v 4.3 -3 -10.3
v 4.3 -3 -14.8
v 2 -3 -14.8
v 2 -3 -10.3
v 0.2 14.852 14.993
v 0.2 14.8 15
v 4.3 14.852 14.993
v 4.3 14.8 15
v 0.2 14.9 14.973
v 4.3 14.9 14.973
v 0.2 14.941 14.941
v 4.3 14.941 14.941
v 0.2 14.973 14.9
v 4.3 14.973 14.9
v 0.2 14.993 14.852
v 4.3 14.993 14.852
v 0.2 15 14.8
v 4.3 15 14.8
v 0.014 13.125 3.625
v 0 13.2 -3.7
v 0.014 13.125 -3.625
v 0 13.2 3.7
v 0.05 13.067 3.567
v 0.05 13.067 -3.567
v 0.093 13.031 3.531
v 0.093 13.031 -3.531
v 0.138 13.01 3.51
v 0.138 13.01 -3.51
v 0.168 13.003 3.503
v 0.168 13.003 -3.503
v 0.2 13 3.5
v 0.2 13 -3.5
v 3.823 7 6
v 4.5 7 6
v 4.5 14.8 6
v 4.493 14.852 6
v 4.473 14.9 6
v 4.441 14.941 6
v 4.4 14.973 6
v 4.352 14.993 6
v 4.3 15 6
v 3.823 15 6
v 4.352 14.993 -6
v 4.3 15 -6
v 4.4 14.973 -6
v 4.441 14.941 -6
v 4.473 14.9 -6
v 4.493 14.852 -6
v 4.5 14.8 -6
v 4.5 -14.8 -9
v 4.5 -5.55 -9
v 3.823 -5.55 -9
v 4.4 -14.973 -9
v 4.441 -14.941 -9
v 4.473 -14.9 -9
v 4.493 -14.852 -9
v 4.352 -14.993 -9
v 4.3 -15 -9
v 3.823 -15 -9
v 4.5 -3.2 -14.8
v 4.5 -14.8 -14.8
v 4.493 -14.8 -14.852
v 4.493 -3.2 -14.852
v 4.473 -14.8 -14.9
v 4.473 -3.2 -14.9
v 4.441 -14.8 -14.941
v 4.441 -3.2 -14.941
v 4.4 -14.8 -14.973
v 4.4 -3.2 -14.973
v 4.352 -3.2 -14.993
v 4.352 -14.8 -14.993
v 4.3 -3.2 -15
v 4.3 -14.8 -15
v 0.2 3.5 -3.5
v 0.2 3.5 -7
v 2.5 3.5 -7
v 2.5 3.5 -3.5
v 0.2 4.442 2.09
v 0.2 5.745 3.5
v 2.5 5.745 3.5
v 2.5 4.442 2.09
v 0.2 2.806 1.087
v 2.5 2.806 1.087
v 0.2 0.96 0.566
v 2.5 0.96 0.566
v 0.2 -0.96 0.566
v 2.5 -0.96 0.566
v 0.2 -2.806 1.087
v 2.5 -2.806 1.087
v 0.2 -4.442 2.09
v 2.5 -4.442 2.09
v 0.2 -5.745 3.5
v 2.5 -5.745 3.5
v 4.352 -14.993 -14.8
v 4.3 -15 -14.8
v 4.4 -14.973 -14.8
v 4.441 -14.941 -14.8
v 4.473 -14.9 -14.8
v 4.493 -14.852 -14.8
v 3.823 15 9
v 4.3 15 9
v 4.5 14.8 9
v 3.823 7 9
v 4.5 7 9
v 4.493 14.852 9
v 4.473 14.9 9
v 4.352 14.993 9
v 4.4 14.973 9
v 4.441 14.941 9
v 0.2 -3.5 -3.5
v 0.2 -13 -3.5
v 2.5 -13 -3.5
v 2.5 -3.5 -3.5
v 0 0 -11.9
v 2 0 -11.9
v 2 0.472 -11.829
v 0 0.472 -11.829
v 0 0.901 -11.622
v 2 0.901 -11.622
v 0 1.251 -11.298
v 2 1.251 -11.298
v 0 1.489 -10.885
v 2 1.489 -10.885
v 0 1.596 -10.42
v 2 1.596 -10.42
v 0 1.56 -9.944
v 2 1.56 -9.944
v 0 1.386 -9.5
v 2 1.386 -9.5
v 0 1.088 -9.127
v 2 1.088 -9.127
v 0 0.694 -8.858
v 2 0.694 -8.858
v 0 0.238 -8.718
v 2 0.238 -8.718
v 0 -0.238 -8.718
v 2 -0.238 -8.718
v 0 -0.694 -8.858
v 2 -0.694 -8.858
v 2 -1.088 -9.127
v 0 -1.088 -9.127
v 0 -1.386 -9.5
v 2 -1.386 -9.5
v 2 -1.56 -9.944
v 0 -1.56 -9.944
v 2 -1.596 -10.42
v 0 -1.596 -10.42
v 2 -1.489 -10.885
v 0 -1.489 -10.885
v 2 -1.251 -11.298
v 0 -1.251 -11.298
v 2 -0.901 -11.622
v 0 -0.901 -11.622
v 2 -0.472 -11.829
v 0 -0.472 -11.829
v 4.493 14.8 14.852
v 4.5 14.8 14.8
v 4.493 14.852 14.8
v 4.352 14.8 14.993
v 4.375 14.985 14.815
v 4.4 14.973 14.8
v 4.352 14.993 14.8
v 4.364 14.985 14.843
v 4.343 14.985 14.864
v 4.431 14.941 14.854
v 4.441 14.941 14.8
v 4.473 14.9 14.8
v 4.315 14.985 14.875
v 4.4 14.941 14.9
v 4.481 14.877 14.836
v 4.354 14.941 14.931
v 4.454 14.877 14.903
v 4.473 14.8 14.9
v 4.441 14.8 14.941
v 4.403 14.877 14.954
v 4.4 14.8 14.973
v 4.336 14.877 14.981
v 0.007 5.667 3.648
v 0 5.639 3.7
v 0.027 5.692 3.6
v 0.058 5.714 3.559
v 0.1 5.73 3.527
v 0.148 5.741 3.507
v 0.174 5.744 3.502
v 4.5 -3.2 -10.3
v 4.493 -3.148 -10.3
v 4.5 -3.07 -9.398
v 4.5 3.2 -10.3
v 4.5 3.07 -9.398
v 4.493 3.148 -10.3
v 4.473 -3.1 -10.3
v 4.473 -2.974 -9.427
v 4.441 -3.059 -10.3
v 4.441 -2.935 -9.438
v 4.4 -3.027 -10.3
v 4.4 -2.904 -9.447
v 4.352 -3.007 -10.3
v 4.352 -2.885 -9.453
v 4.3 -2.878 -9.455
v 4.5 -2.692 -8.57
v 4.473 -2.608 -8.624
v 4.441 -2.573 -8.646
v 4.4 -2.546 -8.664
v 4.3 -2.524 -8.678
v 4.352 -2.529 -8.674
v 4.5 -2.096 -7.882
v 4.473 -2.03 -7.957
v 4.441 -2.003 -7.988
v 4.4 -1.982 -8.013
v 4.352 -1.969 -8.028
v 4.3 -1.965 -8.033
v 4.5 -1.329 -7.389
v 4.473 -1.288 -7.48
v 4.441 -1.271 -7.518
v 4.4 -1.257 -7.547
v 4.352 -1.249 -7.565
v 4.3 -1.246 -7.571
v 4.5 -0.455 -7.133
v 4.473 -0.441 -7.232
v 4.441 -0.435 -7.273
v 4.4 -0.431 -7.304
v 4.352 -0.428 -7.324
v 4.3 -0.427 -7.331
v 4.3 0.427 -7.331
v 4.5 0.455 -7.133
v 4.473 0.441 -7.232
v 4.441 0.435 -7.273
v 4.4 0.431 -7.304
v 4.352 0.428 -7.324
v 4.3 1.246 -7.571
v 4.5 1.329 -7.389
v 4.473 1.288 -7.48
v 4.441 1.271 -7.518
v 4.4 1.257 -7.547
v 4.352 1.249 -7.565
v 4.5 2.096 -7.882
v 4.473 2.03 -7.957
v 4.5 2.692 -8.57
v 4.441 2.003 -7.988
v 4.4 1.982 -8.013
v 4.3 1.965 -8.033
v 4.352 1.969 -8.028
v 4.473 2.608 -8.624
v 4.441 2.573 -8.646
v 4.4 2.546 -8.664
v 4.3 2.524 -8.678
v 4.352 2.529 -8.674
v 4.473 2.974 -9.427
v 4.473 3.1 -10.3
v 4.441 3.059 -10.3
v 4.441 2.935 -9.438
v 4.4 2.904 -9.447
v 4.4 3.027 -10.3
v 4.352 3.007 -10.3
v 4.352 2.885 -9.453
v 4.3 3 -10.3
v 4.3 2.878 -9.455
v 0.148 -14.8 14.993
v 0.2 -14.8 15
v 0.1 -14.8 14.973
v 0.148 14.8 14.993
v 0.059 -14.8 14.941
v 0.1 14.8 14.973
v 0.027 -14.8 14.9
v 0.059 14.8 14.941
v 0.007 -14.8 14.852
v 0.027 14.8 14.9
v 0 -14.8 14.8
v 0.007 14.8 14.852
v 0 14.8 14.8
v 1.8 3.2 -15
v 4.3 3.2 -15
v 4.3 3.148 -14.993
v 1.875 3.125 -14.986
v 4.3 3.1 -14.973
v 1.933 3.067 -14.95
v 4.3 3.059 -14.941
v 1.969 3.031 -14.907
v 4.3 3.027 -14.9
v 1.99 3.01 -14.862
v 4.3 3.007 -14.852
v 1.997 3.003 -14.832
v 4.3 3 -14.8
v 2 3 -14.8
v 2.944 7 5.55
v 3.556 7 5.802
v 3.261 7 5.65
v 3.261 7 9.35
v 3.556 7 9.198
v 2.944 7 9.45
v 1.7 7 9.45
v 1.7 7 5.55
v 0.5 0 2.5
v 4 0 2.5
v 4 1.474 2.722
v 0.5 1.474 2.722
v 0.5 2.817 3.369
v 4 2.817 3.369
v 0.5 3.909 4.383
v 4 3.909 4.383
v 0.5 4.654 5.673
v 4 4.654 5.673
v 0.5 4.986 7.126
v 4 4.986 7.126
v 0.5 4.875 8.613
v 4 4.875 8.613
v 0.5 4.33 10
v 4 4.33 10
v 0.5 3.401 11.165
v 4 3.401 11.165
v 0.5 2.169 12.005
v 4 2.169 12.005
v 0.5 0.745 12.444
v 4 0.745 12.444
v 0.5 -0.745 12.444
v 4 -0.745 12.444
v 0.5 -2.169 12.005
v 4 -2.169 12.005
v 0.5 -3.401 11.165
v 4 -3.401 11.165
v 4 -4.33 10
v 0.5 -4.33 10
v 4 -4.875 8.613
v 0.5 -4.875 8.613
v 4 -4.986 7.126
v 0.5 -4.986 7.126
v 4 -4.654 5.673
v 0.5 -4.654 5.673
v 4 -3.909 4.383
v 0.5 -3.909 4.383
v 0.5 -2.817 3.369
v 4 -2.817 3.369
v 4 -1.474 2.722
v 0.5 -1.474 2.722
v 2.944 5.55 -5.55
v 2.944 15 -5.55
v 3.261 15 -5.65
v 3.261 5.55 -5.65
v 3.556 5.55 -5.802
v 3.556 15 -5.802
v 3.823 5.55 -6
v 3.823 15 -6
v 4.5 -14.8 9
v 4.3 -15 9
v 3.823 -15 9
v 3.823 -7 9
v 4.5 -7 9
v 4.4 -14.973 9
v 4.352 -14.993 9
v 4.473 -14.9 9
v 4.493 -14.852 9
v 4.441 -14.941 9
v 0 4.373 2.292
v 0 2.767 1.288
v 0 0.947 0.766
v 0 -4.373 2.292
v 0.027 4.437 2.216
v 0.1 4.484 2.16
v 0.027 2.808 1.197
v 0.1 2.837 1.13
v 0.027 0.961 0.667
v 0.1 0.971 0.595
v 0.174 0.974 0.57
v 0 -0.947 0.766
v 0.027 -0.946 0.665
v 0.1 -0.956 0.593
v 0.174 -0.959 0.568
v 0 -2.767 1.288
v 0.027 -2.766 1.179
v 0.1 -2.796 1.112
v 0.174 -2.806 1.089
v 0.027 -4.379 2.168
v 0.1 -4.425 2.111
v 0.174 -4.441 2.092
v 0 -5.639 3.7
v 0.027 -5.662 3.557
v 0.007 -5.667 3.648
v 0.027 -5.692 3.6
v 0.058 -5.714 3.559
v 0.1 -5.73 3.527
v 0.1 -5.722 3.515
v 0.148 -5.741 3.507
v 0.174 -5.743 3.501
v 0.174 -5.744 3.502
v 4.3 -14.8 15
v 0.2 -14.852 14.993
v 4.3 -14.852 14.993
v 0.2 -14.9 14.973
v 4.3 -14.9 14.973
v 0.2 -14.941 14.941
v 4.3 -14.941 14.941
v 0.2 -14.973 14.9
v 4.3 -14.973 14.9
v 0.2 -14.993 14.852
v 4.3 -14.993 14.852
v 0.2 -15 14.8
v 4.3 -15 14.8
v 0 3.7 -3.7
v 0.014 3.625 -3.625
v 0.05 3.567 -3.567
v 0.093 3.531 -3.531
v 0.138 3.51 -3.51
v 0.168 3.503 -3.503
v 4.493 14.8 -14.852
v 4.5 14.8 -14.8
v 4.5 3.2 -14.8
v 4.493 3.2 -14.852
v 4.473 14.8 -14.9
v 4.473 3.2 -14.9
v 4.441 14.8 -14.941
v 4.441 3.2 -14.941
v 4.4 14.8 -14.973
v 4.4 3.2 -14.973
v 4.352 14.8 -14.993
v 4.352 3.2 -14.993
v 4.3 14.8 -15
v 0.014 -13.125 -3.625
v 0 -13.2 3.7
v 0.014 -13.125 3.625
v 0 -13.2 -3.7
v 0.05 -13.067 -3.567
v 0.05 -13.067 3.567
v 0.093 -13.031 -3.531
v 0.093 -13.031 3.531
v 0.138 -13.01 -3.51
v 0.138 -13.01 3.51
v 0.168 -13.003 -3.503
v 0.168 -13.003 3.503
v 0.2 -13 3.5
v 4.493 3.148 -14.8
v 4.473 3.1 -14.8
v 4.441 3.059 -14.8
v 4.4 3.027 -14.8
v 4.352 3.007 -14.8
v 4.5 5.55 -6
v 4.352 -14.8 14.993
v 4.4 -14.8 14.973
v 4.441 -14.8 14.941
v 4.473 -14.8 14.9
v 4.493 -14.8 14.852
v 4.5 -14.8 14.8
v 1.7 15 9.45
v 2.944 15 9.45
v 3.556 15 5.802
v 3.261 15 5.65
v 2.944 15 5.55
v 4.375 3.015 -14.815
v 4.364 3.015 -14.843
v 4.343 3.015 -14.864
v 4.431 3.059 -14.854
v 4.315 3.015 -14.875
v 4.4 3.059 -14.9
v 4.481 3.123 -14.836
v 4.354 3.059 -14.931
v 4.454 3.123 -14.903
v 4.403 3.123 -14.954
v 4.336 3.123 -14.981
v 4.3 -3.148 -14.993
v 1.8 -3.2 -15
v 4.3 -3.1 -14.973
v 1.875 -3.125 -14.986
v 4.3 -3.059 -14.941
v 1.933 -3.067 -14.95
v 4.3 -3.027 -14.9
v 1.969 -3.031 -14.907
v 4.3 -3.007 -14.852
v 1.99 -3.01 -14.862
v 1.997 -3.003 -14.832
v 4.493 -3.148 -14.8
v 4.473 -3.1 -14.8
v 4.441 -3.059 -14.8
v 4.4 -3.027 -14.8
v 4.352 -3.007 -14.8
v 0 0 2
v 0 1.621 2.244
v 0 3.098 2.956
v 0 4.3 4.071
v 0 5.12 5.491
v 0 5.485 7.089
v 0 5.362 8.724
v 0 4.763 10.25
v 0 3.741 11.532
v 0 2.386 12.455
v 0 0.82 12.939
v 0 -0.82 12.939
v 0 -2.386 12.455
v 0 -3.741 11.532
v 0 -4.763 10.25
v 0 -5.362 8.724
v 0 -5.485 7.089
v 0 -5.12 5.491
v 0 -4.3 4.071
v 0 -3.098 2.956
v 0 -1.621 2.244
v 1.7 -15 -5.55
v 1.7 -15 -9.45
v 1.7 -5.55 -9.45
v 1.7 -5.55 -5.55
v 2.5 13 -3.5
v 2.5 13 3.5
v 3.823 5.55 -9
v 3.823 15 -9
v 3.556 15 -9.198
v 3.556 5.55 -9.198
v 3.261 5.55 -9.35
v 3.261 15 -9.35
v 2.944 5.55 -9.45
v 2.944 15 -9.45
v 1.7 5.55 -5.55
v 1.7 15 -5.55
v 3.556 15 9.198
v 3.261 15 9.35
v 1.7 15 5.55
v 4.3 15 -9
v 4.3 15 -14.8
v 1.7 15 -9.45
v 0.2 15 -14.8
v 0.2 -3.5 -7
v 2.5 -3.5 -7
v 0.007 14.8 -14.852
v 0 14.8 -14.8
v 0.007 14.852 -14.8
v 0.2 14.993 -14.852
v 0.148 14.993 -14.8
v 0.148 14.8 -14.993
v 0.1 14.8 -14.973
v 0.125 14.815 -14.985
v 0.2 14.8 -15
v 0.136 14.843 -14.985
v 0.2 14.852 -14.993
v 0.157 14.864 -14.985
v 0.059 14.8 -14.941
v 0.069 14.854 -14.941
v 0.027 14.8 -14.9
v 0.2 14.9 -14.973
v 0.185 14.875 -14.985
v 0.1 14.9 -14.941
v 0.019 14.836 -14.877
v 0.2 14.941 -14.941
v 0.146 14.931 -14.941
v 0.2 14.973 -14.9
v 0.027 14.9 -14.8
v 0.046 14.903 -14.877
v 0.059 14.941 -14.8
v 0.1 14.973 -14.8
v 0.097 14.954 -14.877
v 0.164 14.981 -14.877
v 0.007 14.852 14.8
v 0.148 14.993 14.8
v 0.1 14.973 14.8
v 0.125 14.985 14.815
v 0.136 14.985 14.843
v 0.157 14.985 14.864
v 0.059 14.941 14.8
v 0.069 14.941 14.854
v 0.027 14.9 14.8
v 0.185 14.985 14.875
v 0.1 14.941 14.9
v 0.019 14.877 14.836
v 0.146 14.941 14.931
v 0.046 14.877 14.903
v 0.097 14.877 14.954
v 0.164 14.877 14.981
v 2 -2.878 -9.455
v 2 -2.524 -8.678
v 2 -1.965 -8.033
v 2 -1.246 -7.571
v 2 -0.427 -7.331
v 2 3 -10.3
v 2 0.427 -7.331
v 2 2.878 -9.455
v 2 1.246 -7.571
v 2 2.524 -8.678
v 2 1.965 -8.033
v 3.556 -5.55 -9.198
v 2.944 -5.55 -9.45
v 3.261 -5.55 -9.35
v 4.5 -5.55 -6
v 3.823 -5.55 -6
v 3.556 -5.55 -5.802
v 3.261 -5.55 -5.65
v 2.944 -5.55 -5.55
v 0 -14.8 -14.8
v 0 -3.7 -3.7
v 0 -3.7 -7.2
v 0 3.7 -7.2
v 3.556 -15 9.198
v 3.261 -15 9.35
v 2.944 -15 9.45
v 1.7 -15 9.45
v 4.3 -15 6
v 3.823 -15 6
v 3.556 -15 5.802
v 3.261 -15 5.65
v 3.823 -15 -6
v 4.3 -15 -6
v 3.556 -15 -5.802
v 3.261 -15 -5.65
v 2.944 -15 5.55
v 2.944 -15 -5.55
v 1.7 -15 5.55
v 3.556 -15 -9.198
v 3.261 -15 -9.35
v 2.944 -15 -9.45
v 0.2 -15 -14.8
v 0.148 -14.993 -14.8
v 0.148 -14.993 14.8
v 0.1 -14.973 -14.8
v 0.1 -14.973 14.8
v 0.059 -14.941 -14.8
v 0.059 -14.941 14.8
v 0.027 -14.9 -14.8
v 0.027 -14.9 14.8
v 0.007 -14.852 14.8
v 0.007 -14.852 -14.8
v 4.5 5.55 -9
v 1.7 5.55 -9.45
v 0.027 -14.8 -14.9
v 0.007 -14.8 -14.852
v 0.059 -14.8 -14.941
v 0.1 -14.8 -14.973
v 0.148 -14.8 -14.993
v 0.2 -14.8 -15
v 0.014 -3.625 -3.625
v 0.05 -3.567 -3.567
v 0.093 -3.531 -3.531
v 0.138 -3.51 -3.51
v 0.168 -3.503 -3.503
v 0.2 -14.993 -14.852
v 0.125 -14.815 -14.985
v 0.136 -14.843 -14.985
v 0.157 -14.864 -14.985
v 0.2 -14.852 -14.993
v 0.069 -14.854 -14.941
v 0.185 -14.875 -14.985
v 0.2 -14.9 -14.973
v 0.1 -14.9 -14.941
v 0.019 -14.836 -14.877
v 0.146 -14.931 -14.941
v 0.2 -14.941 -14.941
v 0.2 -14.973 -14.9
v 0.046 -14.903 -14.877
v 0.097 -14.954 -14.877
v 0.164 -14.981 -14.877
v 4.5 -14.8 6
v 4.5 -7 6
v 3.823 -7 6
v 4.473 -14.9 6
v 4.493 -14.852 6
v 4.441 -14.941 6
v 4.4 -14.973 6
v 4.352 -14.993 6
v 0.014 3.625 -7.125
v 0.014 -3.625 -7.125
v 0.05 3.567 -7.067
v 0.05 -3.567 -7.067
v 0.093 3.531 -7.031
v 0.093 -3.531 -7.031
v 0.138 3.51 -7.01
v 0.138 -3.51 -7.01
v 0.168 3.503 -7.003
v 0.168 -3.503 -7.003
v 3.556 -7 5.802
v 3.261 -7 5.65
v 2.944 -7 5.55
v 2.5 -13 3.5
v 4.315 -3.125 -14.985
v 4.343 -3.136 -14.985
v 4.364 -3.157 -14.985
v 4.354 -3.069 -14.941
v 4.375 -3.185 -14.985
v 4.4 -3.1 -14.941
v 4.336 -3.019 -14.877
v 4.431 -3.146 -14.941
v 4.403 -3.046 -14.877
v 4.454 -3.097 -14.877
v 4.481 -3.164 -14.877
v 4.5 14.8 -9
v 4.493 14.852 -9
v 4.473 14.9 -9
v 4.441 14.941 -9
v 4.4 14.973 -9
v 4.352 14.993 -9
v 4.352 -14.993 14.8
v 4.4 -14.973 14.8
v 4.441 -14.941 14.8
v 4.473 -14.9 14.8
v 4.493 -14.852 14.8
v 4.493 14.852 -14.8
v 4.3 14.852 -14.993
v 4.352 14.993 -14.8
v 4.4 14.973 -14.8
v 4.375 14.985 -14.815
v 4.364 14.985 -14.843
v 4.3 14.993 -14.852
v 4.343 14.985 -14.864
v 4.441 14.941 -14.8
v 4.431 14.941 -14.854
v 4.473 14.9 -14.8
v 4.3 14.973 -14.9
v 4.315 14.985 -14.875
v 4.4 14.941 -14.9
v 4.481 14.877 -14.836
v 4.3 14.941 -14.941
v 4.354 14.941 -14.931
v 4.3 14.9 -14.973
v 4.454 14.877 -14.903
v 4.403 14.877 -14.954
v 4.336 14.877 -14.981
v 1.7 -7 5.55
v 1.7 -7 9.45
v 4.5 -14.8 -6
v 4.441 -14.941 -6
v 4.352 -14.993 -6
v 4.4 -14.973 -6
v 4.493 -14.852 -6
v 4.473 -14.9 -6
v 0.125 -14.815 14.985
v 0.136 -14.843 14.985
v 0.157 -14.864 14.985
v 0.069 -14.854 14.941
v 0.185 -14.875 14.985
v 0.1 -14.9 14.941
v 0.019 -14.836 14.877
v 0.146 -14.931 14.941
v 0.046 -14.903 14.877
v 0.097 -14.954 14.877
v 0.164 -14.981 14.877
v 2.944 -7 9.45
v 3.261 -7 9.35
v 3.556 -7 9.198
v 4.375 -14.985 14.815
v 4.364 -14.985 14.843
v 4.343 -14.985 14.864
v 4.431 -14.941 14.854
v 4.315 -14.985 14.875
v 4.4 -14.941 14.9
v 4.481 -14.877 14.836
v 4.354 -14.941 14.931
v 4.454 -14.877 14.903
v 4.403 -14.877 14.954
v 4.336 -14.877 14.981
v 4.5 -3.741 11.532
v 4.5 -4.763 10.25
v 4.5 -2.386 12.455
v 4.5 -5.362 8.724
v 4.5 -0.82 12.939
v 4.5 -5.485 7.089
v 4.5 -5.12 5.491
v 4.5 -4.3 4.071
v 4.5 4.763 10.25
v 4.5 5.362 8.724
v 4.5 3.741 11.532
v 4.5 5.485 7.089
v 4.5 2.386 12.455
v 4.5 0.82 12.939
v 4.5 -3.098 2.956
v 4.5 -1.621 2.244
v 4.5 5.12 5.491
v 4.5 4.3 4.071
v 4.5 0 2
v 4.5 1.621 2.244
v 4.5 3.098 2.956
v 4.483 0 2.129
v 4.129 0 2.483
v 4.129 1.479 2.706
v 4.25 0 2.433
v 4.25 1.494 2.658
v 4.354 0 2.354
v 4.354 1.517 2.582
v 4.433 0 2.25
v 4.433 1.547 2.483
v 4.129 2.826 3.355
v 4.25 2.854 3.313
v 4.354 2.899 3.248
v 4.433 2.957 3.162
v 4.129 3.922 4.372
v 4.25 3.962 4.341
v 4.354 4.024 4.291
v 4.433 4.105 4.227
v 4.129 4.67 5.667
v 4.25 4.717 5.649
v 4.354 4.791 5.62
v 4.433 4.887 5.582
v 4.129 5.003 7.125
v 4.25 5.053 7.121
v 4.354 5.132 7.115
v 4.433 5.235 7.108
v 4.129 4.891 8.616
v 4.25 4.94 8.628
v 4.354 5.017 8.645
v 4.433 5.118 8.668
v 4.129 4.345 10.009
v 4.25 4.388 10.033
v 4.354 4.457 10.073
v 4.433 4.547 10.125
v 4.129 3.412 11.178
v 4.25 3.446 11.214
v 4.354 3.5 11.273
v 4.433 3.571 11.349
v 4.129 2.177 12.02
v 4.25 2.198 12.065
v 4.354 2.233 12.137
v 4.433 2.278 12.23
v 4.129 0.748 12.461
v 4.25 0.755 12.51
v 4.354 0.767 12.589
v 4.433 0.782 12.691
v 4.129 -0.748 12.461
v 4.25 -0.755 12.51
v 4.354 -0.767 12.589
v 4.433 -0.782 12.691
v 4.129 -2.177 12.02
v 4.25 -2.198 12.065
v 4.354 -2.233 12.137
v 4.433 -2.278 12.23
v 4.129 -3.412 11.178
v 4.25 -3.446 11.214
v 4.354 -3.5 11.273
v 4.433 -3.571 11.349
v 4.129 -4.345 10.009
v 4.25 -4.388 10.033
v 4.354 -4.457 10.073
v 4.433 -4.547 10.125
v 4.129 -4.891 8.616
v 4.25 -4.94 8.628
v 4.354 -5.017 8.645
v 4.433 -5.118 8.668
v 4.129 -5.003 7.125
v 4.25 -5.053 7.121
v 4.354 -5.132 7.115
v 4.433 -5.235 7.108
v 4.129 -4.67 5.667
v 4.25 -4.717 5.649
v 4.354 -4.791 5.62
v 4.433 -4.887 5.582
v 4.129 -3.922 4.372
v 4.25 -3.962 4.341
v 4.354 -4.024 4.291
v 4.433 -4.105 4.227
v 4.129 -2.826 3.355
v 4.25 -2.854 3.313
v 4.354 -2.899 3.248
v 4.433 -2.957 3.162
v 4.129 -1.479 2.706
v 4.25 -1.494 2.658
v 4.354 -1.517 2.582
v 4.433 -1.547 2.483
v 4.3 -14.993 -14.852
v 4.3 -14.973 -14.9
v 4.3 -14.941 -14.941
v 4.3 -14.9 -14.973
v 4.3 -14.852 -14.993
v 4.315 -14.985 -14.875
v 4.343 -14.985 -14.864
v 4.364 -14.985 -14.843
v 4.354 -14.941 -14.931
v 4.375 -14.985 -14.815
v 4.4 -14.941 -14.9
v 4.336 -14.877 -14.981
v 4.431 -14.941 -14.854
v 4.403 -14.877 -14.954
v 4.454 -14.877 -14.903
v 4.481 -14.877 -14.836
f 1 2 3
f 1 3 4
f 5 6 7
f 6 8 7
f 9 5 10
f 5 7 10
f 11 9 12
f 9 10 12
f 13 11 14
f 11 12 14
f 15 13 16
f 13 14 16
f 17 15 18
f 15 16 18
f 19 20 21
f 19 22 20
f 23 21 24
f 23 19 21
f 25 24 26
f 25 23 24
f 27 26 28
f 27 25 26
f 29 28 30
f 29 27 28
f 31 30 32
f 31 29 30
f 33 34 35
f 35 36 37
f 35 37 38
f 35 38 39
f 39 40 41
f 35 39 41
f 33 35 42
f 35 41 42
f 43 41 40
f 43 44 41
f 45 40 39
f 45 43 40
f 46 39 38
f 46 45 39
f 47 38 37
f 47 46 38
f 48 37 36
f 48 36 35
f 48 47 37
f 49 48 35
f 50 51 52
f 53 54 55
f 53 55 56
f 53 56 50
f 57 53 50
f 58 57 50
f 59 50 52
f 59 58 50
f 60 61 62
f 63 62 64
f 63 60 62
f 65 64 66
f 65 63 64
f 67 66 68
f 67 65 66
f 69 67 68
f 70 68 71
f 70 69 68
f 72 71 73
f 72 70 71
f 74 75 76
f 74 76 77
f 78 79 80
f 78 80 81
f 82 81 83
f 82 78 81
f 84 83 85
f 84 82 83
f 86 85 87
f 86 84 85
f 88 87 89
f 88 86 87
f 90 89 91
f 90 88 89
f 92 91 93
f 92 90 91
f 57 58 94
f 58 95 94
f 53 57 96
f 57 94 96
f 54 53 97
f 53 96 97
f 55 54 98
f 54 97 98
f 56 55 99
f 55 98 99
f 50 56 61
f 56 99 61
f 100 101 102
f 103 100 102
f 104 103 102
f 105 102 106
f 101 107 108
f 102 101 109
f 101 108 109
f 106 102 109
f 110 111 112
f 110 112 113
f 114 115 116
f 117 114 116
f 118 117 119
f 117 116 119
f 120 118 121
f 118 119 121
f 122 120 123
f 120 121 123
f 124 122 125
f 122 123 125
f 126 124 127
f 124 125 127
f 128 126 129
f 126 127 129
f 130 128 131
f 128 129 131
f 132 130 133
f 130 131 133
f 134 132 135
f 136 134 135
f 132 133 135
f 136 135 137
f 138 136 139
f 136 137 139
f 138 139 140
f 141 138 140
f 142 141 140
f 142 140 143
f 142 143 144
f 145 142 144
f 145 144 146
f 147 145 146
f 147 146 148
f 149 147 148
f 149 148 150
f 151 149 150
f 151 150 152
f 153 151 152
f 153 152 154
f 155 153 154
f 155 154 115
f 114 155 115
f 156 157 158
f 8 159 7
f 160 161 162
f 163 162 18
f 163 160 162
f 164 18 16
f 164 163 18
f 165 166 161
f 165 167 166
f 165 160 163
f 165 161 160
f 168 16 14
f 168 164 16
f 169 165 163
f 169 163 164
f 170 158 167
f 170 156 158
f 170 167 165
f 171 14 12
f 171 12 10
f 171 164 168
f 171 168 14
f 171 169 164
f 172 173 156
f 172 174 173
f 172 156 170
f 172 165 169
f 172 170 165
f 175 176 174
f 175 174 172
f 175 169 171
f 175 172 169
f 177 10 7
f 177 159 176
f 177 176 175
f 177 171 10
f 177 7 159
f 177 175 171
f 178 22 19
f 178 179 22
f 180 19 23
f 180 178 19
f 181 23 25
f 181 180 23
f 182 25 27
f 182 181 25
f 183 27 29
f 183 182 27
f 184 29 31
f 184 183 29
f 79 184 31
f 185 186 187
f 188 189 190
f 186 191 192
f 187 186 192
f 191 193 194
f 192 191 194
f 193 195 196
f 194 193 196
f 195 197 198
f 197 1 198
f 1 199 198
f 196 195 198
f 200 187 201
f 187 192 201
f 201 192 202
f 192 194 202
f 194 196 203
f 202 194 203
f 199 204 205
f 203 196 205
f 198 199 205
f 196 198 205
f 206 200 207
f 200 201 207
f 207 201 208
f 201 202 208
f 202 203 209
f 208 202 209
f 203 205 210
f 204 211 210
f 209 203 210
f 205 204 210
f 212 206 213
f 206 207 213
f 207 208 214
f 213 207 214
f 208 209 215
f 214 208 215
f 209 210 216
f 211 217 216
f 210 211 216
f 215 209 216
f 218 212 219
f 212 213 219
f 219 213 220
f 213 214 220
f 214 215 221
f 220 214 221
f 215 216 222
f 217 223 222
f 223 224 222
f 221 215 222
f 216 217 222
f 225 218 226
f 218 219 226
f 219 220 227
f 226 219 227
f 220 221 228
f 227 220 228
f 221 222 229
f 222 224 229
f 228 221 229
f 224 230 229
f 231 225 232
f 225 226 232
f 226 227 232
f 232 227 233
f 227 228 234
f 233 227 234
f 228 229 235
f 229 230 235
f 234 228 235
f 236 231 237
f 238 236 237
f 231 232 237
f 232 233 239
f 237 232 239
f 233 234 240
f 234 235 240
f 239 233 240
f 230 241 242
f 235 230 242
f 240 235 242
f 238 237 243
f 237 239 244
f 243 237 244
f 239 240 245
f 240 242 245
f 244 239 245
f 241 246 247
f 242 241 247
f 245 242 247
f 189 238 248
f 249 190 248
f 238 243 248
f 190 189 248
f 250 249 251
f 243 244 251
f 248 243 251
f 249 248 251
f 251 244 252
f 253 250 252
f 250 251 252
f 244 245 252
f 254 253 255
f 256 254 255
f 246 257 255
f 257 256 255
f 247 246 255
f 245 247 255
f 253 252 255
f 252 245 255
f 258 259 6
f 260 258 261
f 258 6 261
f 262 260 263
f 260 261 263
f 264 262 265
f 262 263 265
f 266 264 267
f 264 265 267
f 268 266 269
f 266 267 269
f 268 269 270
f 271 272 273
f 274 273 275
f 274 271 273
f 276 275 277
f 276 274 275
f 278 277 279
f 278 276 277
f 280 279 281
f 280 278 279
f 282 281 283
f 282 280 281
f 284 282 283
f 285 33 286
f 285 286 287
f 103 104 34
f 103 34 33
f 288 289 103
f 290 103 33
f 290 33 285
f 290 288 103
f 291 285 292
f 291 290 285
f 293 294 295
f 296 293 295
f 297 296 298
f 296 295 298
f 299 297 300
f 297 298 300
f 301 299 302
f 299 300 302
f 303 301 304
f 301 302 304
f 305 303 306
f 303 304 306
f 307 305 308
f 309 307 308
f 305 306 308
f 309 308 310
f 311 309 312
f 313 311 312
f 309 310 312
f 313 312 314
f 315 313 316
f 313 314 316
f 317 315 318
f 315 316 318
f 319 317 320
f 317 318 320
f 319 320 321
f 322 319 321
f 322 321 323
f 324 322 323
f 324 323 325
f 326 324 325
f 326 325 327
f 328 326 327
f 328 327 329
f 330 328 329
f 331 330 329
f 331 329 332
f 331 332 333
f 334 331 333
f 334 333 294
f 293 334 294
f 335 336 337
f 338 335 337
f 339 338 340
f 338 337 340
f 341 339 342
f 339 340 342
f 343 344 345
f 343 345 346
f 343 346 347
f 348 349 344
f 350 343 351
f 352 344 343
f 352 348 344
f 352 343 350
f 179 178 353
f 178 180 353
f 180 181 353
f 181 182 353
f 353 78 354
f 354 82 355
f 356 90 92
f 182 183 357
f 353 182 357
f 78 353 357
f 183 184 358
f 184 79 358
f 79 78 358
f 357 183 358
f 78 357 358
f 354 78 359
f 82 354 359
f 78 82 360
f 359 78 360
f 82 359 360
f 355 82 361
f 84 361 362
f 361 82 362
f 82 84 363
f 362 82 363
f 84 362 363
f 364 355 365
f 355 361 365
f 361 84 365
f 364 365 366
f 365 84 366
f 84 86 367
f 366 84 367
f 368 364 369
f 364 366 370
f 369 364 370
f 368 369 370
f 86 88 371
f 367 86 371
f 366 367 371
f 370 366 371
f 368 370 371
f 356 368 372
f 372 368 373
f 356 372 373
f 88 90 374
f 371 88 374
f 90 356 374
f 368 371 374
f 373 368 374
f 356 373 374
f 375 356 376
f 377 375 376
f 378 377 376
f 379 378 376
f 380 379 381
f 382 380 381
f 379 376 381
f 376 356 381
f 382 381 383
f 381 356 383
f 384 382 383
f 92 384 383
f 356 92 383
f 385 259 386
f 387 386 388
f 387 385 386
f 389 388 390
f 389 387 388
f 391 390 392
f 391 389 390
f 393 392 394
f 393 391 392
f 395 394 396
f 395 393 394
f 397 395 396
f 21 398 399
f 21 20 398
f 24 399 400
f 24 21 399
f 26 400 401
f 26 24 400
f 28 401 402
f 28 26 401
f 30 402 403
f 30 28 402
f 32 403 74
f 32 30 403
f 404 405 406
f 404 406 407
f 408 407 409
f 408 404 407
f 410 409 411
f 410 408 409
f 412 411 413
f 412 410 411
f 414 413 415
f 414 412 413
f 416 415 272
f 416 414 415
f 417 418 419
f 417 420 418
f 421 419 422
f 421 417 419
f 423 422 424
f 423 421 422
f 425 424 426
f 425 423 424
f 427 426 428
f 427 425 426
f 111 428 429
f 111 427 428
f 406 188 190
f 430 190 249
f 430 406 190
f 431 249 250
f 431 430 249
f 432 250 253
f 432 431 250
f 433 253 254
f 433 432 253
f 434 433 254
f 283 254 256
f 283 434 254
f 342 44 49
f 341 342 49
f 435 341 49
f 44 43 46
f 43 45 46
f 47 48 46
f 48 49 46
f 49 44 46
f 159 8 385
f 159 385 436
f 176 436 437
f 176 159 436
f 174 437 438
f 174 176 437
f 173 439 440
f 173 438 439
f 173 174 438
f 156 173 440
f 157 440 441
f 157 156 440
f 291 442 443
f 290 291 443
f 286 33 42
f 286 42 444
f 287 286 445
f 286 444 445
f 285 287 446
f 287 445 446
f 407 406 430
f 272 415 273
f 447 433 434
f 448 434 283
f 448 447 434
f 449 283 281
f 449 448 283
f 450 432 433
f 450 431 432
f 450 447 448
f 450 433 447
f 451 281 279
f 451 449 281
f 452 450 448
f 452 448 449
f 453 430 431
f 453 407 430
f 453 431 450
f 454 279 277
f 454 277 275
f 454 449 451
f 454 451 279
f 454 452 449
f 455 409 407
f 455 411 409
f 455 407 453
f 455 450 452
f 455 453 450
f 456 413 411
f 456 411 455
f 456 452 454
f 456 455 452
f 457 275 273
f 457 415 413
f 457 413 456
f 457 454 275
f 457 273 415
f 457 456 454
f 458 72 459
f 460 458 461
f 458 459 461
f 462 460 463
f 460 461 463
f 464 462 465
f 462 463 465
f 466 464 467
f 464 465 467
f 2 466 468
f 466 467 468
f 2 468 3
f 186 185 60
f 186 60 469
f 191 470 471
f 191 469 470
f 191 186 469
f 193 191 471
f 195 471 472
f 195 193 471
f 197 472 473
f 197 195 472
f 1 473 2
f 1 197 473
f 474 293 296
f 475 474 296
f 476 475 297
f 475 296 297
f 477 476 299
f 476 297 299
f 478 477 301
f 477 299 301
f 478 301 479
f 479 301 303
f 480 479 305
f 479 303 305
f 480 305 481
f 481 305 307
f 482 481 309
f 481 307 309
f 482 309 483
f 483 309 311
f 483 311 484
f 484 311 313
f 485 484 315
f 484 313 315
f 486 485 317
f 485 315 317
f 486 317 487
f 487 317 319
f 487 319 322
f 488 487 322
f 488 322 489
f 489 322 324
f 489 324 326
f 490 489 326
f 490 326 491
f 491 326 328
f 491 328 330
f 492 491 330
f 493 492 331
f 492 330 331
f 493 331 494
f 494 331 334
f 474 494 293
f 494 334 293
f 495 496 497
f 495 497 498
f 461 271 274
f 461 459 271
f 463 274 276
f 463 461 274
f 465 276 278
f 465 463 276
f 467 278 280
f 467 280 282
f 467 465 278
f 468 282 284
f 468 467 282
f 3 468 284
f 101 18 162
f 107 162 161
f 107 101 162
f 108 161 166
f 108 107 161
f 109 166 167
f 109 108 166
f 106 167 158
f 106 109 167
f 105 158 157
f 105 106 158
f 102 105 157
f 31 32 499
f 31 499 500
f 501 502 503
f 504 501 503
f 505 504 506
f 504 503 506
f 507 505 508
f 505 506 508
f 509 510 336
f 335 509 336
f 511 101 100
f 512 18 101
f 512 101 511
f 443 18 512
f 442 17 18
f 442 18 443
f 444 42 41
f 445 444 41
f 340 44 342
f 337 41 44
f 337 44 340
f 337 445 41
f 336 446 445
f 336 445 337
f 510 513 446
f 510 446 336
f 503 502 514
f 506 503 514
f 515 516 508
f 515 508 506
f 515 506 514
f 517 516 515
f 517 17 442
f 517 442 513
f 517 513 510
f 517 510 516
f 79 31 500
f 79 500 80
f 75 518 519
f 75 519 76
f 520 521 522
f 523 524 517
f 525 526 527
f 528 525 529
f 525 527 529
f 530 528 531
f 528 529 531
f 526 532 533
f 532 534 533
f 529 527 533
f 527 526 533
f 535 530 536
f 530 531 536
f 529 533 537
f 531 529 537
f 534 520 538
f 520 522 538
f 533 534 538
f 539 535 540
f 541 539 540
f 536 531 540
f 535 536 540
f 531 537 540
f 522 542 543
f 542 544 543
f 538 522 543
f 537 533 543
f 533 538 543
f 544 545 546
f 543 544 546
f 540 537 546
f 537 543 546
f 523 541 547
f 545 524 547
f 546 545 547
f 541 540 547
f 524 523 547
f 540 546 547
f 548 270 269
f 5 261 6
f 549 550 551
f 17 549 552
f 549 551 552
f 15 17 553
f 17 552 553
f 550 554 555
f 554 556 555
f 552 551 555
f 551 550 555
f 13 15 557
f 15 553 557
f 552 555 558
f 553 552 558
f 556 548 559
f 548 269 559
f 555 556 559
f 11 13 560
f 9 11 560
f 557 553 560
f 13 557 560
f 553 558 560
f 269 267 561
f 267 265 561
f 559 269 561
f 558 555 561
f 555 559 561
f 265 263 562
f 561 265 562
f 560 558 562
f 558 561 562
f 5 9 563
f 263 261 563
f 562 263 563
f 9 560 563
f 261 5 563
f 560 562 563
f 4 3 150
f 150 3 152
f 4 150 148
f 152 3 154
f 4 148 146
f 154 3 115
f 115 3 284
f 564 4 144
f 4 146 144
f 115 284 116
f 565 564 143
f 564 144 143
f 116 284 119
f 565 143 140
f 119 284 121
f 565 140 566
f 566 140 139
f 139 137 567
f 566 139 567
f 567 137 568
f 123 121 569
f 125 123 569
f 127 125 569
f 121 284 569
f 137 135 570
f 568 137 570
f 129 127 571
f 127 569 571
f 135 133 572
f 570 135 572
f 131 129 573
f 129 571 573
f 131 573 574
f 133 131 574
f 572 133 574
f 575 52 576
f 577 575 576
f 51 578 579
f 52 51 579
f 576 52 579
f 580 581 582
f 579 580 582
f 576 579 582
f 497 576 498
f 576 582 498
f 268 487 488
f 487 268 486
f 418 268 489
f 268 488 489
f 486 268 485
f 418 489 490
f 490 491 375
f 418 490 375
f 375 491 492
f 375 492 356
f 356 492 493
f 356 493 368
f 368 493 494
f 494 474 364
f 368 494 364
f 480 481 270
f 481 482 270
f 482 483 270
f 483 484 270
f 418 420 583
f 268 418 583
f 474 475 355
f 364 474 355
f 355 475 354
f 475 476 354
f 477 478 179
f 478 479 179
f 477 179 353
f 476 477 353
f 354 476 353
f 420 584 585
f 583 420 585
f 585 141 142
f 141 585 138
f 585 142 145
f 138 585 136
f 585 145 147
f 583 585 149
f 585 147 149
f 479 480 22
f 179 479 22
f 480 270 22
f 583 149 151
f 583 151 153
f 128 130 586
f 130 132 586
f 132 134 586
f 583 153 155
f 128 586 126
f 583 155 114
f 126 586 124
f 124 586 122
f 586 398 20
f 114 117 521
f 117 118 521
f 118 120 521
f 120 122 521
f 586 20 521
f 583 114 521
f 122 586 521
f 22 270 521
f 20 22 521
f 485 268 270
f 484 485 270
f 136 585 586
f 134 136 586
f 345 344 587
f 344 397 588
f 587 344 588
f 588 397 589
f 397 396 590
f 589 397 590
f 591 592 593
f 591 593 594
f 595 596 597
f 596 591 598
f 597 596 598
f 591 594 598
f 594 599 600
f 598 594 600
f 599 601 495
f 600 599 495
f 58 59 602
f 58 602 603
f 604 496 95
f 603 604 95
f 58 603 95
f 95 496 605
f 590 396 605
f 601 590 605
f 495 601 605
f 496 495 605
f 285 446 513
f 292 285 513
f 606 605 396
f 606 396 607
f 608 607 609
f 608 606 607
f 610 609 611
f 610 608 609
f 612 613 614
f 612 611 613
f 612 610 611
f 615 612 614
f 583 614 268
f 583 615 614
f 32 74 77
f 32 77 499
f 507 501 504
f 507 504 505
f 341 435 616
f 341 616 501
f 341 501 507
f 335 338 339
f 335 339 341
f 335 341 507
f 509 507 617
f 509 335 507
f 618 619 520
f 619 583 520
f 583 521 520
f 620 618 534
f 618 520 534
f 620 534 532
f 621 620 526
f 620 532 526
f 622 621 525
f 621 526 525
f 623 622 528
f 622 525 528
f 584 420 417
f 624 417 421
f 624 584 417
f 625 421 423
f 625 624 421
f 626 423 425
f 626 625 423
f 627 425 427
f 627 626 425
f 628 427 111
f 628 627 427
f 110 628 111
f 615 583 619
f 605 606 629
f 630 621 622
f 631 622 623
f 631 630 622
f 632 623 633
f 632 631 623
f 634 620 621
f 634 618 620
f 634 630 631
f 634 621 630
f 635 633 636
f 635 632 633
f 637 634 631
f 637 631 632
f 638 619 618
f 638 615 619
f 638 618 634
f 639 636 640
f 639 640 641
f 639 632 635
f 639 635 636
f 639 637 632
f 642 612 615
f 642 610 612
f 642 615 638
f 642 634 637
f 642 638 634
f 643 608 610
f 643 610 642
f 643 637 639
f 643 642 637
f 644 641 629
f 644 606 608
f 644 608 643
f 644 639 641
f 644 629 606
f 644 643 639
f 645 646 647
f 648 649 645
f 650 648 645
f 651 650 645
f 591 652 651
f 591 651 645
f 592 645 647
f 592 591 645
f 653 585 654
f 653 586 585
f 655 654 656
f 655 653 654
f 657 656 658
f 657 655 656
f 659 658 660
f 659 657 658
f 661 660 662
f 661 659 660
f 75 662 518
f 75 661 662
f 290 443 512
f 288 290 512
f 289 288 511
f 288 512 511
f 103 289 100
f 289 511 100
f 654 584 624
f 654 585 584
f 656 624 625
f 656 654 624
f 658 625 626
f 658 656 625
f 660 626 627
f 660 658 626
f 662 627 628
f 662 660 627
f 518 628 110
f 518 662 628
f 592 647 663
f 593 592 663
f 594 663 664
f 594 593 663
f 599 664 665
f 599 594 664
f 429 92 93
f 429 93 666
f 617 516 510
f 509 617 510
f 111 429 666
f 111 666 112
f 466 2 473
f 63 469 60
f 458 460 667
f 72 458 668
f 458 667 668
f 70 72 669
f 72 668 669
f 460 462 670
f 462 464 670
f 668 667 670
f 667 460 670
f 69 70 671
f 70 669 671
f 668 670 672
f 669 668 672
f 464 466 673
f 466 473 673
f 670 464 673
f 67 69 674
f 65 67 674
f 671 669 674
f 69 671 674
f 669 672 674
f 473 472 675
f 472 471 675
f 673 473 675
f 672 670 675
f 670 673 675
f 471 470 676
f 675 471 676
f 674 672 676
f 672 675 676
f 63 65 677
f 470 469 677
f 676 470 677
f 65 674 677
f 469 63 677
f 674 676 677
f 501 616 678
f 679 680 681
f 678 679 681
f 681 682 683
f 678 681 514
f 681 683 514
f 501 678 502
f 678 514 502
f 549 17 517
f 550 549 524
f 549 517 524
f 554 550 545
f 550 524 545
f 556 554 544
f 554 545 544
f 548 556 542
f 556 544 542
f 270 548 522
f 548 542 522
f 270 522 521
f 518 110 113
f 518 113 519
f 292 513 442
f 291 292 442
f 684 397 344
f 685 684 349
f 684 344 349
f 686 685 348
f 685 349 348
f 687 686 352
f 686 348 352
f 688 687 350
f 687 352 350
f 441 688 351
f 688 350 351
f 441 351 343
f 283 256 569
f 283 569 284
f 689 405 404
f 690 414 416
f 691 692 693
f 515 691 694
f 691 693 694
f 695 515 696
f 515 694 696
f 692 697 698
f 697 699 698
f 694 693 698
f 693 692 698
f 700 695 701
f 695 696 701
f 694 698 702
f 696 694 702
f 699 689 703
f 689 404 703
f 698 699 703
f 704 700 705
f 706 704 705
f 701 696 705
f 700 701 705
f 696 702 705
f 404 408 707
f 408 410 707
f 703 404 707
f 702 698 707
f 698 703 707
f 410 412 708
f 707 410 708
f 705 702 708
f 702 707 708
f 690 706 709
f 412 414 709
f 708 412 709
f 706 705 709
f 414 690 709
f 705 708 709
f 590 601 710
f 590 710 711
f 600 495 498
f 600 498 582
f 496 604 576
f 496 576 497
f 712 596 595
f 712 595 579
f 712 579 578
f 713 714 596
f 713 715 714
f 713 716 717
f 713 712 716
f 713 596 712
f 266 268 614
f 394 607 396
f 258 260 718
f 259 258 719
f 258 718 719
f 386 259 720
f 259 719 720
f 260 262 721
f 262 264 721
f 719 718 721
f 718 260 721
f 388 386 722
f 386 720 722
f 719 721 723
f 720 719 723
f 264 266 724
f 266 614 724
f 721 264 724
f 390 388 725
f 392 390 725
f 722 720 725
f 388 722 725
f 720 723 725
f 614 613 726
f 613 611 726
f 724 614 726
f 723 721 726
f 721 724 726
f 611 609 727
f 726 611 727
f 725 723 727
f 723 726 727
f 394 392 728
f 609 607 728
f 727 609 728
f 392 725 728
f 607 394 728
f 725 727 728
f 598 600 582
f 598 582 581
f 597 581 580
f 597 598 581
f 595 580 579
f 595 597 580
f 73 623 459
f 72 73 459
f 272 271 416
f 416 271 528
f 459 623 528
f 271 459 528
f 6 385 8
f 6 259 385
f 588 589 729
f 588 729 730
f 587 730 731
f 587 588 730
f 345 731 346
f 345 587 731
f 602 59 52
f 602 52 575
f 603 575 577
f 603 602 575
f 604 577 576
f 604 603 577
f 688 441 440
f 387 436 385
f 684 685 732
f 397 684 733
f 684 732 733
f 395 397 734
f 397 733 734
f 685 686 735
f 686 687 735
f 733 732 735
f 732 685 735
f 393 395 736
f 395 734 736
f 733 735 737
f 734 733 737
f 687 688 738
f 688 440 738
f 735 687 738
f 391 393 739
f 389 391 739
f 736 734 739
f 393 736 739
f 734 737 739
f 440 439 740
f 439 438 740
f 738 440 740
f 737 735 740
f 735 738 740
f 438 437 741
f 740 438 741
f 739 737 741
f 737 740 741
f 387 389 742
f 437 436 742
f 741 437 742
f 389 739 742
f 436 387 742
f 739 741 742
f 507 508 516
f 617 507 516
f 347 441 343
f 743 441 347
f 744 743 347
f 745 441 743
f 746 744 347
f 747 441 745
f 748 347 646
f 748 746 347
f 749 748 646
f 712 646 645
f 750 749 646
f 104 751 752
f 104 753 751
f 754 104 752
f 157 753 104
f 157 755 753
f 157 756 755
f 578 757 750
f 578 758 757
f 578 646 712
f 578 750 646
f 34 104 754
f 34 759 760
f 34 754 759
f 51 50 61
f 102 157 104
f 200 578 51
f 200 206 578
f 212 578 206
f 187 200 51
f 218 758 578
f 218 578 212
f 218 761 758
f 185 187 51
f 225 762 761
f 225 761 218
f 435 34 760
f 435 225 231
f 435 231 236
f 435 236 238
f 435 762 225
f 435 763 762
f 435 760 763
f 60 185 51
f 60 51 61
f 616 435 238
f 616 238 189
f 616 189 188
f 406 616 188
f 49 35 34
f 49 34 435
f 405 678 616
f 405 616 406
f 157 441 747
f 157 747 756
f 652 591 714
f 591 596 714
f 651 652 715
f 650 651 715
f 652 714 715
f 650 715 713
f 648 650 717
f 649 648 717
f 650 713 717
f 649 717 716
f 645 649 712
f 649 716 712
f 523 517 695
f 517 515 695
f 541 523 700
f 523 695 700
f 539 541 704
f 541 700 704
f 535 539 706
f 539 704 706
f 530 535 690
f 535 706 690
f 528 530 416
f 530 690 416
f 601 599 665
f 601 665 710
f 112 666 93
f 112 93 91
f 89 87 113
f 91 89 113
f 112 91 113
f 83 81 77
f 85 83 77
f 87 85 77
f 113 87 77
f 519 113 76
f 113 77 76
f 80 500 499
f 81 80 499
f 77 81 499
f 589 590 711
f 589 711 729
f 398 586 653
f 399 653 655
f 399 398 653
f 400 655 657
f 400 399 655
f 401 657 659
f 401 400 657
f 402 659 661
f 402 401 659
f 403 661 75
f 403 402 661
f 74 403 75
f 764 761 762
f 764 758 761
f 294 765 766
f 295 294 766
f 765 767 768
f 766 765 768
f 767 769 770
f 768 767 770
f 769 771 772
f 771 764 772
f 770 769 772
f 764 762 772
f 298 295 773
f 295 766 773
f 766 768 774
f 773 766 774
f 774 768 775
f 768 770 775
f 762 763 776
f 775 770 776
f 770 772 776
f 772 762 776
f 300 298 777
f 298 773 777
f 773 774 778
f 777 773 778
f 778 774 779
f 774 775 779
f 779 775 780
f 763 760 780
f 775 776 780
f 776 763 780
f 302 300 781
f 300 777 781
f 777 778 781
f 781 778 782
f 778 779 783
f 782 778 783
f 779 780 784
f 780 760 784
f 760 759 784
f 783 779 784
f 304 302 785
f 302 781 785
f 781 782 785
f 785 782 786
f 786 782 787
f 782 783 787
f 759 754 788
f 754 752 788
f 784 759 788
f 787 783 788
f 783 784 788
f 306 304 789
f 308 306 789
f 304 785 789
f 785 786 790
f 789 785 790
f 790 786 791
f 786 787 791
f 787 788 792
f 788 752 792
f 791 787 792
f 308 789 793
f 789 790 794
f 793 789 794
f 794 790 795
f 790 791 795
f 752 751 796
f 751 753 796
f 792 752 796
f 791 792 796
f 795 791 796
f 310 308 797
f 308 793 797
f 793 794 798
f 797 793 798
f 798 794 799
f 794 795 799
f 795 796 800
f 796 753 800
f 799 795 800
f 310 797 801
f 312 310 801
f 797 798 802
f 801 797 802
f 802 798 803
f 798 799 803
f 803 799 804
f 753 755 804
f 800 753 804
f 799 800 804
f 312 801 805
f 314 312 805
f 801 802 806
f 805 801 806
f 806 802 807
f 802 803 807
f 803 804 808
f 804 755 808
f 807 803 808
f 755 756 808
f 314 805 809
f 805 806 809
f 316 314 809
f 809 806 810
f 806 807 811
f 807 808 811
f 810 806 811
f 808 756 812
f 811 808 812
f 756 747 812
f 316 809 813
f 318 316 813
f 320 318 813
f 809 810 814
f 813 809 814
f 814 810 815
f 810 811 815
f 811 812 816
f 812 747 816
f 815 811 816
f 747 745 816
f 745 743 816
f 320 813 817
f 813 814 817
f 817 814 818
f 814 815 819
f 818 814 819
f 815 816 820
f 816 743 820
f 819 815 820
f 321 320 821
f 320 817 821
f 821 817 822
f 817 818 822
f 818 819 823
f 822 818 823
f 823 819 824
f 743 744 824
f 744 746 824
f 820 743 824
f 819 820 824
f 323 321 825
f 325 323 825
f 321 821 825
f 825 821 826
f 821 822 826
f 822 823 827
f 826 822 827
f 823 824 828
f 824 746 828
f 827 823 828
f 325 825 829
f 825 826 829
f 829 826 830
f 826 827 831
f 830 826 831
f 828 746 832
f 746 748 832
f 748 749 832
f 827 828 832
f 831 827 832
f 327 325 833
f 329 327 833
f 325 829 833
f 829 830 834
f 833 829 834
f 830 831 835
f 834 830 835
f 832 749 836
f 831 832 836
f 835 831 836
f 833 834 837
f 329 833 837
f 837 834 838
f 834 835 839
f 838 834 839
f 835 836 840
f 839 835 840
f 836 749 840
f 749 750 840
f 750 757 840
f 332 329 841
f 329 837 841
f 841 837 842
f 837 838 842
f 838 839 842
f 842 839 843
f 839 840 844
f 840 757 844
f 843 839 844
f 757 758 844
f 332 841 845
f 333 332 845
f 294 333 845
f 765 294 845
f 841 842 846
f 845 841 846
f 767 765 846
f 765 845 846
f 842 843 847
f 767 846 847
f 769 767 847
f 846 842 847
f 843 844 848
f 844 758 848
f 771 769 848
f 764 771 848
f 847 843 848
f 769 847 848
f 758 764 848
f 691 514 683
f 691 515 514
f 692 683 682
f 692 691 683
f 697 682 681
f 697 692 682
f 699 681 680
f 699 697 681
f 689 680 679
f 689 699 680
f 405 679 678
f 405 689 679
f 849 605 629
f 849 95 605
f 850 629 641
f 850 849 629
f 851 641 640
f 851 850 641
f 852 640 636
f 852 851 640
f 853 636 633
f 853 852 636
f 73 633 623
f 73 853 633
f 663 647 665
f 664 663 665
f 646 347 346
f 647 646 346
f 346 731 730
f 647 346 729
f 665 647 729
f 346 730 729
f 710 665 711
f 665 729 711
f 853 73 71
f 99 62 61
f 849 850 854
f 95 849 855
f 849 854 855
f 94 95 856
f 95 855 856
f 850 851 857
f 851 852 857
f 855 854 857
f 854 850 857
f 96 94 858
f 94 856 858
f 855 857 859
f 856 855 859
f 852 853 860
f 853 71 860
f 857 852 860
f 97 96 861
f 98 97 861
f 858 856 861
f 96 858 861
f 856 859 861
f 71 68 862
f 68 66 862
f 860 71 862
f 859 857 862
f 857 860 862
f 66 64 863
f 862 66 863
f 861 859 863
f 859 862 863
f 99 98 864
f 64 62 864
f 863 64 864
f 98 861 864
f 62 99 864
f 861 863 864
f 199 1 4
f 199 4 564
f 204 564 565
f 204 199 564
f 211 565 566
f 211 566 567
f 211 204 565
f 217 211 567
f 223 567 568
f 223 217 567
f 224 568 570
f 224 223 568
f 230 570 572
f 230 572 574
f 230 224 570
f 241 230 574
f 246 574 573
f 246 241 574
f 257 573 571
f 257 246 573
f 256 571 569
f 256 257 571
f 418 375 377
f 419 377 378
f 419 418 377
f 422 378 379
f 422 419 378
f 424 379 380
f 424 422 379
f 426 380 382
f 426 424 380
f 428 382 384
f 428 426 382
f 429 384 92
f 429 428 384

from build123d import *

# Parameters (mm, degrees)
SKETCH_1_W          = 30
SKETCH_1_H          = 30
EXTRUDE_1_DEPTH     = 4.5
SKETCH_2_R          = 5
SKETCH_2_R_2        = 1.6
CUT_EXTRUDE_1_DEPTH = 22.685248442
CUT_EXTRUDE_2_DEPTH = 2.5
CUT_EXTRUDE_3_DEPTH = 8
CUT_EXTRUDE_4_DEPTH = 9.45
CUT_EXTRUDE_5_DEPTH = 2.5
FILLET_1_R          = 0.2
FILLET_2_R          = 0.2
CHAMFER_1_SIZE      = 0.5
FILLET_3_R          = 0.5


with BuildPart() as part:
    # 草图1 → 凸台-拉伸1 (new body)
    with BuildSketch(Plane(origin=(0, 0, 0), x_dir=(0, 0, -1), z_dir=(1, 0, 0))):
        Rectangle(SKETCH_1_W, SKETCH_1_H)
    extrude(amount=EXTRUDE_1_DEPTH)

    # 草图2 → 切除-拉伸1 (cut, through all)
    with BuildSketch(Plane(origin=(4.5, 0, 0), x_dir=(0, 0, -1), z_dir=(1, 0, 0))):
        with Locations((-7.5, 0)):
            Circle(SKETCH_2_R)
        with Locations((10.3, 0)):
            Circle(SKETCH_2_R_2)
    extrude(amount=-CUT_EXTRUDE_1_DEPTH, mode=Mode.SUBTRACT)

    # 草图3 → 切除-拉伸2 (cut)
    with BuildSketch(Plane(origin=(4.5, 0, 0), x_dir=(0, 0, -1), z_dir=(1, 0, 0))):
        with BuildLine():
            Line((10.3, 3), (15, 3))
            Line((15, 3), (15, -3))
            Line((15, -3), (10.3, -3))
            ThreePointArc((10.3, -3), (7.3, 0), (10.3, 3))
        make_face()
    extrude(amount=-CUT_EXTRUDE_2_DEPTH, mode=Mode.SUBTRACT)

    # 草图4 → 切除-拉伸3 (cut)
    with BuildSketch(Plane.XZ.offset(15)):
        with BuildLine():
            Line((1.7, 5.55), (1.7, 9.45))
            Line((1.7, 9.45), (2.944409721, 9.45))
            ThreePointArc((2.944409721, 9.45), (3.411838473, 9.280042303), (3.822875656, 9))
            Line((3.822875656, 9), (4.5, 9))
            Line((4.5, 9), (4.5, 6))
            Line((4.5, 6), (3.822875656, 6))
            ThreePointArc((3.822875656, 6), (3.411838473, 5.719957697), (2.944409721, 5.55))
            Line((2.944409721, 5.55), (1.7, 5.55))
        make_face()
    cut_extrude_3 = extrude(amount=-CUT_EXTRUDE_3_DEPTH, mode=Mode.SUBTRACT)

    # 镜向1: 切除-拉伸3 across plane
    add(cut_extrude_3.mirror(Plane.ZX), mode=Mode.SUBTRACT)

    # 草图5 → 切除-拉伸4 (cut)
    with BuildSketch(Plane.XZ.offset(15)):
        with BuildLine():
            Line((1.7, -9.45), (1.7, -5.55))
            Line((1.7, -5.55), (2.944409721, -5.55))
            ThreePointArc((2.944409721, -5.55), (3.411838473, -5.719957697), (3.822875656, -6))
            Line((3.822875656, -6), (4.5, -6))
            Line((4.5, -6), (4.5, -9))
            Line((4.5, -9), (3.822875656, -9))
            ThreePointArc((3.822875656, -9), (3.411838473, -9.280042303), (2.944409721, -9.45))
            Line((2.944409721, -9.45), (1.7, -9.45))
        make_face()
    cut_extrude_4 = extrude(amount=-CUT_EXTRUDE_4_DEPTH, mode=Mode.SUBTRACT)

    # 镜向2: 切除-拉伸4 across plane
    add(cut_extrude_4.mirror(Plane.ZX), mode=Mode.SUBTRACT)

    # 草图6 → 切除-拉伸5 (cut)
    with BuildSketch(Plane.ZY):
        with BuildLine():
            Line((-3.5, 13), (3.5, 13))
            Line((3.5, 13), (3.5, 5.744562647))
            ThreePointArc((3.5, 5.744562647), (0.5, 0), (3.5, -5.744562647))
            Line((3.5, -5.744562647), (3.5, -13))
            Line((3.5, -13), (-3.5, -13))
            Line((-3.5, -13), (-3.5, -3.5))
            Line((-3.5, -3.5), (-7, -3.5))
            Line((-7, -3.5), (-7, 3.5))
            Line((-7, 3.5), (-3.5, 3.5))
            Line((-3.5, 3.5), (-3.5, 13))
        make_face()
    extrude(amount=-CUT_EXTRUDE_5_DEPTH, mode=Mode.SUBTRACT)

    # 圆角1
    fillet_1_edges = [part.edges().sort_by_distance(p)[0] for p in [
        (4.5, 0, 15),
        (4.5, 15, 0),
        (4.5, -15, 12),
        (4.5, 9, -15),
        (4.5, 0, -7.3),
        (4.5, -3, -12.65),
        (4.5, 3, -12.65),
        (2, 0, -15),
        (3.25, 3, -15),
        (3.25, -3, -15),
        (4.5, -15, 0),
        (4.5, -9, -15),
        (0, -15, 0),
        (0, 0, 15),
        (0, 15, 0),
        (0, 0, -15),
        (4.5, 15, 12),
        (4.5, 15, -12),
        (2.25, -15, -15),
        (2.25, -15, 15),
        (2.25, 15, 15),
        (2.25, 15, -15),
        (4.5, -15, -12),
    ]]
    fillet(fillet_1_edges, radius=FILLET_1_R)

    # 圆角2
    fillet_2_edges = [part.edges().sort_by_distance(p)[0] for p in [
        (0, 8.25, -3.5),
        (0, 3.5, -5.25),
        (0, 0, -7),
        (0, -3.5, -5.25),
        (0, -8.25, -3.5),
        (0, -13, 0),
        (0, -9.372281323, 3.5),
        (0, 0, 0.5),
        (0, 9.372281323, 3.5),
        (0, 13, 0),
    ]]
    fillet(fillet_2_edges, radius=FILLET_2_R)

    # 倒角1
    chamfer_1_edges = [part.edges().sort_by_distance(p)[0] for p in [
        (0, 0, 12.5),
    ]]
    chamfer(chamfer_1_edges, length=CHAMFER_1_SIZE)

    # 圆角3
    fillet_3_edges = [part.edges().sort_by_distance(p)[0] for p in [
        (4.5, 0, 12.5),
    ]]
    fillet(fillet_3_edges, radius=FILLET_3_R)


solid = part.part
